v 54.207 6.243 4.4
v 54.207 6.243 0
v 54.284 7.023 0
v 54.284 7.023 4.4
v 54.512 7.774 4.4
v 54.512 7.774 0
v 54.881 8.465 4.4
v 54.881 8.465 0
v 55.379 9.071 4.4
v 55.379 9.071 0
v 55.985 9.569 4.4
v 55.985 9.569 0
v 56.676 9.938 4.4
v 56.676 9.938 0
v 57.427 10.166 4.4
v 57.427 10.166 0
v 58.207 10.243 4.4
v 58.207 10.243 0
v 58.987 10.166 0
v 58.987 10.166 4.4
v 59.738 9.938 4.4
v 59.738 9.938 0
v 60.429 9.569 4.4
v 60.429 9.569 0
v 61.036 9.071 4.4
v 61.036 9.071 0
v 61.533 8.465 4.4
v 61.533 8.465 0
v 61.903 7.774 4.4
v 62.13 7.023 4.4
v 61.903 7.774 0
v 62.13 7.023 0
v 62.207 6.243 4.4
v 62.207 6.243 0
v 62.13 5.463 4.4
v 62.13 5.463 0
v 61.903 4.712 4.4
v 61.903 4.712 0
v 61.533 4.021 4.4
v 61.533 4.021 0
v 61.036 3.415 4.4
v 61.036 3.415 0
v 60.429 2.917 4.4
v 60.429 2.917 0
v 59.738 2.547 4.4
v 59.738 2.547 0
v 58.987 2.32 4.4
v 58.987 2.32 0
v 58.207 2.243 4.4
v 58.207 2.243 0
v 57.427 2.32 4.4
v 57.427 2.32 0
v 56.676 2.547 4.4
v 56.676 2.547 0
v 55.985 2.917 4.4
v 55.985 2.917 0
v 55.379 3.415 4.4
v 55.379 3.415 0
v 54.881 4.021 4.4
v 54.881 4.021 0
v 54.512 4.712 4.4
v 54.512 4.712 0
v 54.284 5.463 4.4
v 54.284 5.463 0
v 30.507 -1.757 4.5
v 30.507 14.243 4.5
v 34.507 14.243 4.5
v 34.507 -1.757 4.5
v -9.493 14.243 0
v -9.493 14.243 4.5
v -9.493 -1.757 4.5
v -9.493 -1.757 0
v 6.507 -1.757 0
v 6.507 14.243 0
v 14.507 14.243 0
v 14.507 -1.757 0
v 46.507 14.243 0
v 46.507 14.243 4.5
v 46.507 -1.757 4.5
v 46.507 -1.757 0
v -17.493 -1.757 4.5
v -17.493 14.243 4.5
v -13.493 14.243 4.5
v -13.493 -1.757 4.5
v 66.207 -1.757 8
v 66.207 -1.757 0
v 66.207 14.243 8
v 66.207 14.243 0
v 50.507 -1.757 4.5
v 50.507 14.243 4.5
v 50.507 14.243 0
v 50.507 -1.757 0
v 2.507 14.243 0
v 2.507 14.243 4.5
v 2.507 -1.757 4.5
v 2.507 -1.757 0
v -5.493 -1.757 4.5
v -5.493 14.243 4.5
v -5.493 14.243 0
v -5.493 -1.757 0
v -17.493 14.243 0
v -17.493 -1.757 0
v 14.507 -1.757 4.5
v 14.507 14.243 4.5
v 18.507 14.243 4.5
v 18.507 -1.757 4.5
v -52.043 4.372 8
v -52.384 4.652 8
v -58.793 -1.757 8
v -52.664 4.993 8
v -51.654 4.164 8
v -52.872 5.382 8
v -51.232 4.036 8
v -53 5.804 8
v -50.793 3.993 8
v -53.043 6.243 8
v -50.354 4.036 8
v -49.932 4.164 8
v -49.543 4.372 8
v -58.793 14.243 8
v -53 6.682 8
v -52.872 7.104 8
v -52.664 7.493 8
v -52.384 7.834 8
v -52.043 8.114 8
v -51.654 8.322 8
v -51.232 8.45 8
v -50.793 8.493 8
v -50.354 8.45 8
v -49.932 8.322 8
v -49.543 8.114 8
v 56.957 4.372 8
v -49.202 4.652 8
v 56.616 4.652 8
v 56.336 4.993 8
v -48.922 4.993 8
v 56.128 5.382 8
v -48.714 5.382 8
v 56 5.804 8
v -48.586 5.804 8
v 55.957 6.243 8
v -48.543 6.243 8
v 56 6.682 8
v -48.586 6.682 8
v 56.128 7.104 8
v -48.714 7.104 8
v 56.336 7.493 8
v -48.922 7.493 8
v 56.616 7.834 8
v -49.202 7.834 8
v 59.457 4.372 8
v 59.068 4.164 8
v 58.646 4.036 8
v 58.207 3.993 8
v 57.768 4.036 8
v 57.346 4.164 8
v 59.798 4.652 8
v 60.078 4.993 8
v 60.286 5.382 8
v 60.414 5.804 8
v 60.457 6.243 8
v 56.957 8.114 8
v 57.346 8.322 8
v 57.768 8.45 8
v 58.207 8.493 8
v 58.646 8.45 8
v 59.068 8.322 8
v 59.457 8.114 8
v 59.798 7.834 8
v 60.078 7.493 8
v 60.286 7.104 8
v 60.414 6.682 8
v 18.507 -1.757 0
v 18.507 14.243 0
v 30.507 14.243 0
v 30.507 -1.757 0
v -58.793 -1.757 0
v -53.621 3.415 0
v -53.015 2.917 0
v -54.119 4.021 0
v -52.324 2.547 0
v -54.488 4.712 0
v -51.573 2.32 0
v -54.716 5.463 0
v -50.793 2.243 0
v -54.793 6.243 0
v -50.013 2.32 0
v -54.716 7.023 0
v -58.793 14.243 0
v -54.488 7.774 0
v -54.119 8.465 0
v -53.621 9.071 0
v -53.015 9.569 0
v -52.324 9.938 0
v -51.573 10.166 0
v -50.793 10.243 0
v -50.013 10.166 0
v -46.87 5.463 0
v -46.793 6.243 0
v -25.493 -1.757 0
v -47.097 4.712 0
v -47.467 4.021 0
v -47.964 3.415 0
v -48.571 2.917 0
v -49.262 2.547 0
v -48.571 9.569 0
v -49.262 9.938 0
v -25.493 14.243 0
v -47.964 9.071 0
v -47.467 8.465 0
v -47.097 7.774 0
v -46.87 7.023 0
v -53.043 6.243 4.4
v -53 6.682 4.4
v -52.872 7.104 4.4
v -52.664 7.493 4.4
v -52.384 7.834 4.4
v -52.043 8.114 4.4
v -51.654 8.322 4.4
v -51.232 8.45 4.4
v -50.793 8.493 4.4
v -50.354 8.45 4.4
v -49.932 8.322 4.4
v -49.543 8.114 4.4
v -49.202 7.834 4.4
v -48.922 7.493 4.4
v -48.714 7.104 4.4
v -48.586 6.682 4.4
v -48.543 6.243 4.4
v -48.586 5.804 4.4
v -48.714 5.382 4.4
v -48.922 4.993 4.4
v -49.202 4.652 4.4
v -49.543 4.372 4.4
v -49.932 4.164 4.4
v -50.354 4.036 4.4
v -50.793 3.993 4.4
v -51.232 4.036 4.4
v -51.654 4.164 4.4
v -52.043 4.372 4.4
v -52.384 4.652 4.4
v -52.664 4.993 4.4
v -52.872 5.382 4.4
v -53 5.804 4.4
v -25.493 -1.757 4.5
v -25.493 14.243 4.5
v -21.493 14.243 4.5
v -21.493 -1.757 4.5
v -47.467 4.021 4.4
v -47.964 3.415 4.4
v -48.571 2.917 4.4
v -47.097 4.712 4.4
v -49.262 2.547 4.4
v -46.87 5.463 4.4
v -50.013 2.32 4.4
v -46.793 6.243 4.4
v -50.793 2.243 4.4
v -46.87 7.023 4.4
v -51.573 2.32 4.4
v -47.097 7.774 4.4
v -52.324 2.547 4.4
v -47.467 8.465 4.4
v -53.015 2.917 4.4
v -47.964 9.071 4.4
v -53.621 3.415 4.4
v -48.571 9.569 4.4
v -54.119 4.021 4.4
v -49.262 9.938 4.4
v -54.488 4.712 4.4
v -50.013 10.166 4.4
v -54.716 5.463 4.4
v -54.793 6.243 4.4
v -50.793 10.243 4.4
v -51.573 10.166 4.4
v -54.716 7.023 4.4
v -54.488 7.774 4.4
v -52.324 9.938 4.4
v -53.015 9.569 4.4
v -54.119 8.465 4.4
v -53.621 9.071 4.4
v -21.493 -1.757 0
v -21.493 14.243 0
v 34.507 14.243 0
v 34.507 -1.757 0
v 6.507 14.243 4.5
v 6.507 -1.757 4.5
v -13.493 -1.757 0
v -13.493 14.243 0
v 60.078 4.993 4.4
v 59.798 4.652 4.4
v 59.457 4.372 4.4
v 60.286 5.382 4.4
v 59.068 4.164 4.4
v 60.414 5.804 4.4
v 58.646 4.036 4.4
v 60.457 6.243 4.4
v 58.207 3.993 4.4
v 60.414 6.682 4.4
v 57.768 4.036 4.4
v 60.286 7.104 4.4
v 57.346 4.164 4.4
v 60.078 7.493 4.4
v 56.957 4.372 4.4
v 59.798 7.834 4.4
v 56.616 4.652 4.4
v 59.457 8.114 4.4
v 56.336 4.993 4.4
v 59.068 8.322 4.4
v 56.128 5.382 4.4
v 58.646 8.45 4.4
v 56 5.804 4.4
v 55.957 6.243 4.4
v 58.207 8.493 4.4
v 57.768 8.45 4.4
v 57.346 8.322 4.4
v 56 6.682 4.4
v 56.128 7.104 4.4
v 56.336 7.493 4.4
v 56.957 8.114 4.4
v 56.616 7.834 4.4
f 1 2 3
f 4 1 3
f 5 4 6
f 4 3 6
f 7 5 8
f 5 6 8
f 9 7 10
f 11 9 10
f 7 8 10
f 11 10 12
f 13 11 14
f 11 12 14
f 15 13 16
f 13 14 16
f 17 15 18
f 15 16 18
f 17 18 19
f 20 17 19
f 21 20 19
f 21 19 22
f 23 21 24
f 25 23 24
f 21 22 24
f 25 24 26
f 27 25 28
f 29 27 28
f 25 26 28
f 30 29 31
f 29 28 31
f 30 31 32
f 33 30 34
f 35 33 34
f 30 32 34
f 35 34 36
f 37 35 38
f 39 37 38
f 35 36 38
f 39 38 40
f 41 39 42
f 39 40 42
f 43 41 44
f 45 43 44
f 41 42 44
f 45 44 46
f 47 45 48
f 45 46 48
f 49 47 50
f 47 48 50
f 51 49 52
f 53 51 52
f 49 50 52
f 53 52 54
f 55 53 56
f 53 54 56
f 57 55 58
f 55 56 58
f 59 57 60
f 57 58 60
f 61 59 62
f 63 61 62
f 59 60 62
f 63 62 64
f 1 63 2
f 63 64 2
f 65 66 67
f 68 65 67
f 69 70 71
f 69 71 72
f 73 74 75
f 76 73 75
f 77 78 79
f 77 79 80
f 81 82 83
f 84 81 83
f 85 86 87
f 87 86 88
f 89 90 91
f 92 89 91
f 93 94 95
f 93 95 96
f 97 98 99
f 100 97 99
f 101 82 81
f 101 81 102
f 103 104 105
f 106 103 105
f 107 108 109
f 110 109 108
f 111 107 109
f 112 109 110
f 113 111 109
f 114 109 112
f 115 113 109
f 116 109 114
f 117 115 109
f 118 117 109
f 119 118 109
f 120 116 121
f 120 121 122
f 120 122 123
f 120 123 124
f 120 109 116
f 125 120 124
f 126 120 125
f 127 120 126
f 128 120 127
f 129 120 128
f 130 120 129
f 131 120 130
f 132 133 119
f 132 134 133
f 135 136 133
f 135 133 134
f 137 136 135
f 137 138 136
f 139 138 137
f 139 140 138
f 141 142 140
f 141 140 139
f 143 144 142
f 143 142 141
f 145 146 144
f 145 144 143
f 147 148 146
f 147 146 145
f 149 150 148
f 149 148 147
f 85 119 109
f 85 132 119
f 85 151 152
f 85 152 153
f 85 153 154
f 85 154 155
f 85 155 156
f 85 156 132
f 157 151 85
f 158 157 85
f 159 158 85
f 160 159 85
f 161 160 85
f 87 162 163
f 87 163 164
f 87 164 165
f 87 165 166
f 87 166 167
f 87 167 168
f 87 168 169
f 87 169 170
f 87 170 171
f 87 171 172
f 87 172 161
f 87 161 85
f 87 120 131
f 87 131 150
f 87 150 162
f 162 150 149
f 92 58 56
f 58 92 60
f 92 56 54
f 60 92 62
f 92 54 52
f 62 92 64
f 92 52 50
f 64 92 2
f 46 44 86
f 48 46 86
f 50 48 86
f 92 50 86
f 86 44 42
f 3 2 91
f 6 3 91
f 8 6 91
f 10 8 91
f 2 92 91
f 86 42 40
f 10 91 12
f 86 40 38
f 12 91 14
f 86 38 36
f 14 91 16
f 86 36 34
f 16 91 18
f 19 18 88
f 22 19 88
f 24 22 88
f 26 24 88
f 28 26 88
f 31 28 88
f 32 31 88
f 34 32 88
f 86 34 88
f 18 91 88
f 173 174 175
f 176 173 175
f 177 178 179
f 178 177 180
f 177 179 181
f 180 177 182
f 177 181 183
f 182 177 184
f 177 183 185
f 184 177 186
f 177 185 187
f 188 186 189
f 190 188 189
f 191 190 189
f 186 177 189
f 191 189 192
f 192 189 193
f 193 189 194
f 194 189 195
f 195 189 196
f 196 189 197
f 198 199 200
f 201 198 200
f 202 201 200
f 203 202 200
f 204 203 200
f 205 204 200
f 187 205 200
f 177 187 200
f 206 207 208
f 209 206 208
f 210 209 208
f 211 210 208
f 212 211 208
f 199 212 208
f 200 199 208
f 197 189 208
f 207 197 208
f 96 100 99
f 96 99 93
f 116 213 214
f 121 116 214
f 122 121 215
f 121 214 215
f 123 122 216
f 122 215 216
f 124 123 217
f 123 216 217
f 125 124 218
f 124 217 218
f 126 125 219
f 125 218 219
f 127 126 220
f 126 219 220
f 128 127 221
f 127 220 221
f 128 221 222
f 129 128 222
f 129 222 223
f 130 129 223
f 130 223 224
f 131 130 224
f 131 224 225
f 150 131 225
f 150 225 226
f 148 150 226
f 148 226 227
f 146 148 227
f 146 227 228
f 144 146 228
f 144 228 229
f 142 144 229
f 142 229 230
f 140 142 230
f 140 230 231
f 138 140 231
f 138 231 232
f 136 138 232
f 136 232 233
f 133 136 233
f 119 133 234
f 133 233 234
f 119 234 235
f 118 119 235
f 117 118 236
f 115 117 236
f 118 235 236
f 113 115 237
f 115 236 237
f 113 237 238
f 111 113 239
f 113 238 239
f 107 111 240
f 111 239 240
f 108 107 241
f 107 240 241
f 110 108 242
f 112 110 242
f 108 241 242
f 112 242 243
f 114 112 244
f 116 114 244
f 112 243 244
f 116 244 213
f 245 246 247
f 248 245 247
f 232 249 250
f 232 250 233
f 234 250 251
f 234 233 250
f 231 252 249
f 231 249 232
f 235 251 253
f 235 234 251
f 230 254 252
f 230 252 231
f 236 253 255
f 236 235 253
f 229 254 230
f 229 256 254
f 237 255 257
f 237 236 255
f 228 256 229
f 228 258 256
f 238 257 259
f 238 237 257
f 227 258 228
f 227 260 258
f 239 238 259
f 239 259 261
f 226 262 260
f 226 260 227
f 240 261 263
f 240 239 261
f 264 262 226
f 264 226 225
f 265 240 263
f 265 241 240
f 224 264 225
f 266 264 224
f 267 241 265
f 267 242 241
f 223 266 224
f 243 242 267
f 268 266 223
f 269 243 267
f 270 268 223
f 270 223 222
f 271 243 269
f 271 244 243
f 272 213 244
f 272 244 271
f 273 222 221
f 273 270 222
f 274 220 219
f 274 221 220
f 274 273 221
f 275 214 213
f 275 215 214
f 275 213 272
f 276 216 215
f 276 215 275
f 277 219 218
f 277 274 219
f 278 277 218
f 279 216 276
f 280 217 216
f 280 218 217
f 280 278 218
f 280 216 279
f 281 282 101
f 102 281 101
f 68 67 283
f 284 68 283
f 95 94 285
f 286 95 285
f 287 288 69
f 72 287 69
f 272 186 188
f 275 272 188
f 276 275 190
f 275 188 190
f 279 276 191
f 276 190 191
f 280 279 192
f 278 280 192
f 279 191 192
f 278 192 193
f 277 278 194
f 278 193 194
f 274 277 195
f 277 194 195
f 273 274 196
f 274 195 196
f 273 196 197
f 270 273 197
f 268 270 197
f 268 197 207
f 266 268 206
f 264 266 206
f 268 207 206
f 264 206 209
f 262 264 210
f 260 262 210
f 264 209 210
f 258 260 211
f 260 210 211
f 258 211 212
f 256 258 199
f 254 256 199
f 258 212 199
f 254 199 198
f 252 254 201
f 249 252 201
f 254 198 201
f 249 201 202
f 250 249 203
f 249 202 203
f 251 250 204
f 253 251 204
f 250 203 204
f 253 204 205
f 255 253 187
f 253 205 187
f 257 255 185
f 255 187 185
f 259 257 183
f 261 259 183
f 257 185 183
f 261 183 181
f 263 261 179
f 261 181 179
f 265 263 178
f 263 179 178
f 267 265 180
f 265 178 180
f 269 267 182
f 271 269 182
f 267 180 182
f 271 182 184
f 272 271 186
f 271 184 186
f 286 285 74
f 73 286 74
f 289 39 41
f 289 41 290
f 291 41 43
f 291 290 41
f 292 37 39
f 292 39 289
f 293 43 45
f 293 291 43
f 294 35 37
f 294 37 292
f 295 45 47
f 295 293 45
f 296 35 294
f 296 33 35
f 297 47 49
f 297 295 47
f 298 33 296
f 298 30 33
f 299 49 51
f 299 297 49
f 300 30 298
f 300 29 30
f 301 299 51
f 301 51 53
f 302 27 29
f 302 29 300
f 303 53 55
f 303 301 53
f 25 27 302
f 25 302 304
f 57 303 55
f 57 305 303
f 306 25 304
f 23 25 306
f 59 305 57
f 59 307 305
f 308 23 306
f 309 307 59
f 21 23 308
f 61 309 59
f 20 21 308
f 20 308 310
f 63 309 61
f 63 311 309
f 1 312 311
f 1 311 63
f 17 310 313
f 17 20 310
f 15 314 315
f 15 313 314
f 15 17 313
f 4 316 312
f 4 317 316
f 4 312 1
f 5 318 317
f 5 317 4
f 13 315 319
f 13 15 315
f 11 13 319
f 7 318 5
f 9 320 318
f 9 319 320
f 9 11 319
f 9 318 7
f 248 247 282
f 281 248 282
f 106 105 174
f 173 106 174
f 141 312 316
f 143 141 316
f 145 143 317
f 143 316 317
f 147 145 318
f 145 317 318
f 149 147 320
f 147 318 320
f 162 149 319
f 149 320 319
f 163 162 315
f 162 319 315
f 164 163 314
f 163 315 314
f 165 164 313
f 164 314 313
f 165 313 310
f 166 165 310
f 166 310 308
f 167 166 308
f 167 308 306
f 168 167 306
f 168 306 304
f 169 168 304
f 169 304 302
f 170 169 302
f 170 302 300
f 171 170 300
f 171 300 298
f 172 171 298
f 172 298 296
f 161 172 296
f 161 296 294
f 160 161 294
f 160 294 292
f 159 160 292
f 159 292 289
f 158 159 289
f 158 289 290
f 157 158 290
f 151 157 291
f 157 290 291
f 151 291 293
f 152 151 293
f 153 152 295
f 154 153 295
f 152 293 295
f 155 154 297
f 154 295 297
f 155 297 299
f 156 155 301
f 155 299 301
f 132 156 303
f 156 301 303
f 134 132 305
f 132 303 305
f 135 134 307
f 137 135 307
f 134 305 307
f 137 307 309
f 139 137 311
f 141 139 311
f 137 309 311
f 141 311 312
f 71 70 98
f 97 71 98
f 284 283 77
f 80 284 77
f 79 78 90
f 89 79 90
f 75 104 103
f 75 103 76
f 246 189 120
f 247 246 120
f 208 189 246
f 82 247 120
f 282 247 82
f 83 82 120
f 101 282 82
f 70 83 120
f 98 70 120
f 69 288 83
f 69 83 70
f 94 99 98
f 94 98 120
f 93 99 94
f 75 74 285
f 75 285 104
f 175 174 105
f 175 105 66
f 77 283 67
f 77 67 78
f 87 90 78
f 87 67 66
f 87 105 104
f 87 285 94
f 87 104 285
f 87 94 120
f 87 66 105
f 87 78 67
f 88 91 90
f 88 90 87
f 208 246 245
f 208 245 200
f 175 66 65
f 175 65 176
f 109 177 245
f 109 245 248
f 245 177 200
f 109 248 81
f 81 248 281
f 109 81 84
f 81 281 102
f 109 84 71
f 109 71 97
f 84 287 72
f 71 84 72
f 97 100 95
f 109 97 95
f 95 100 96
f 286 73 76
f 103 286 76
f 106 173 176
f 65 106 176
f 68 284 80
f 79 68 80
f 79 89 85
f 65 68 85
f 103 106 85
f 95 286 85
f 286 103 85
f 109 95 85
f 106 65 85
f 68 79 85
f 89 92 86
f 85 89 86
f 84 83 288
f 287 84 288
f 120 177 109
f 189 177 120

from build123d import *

# Parameters (mm, degrees)
SKETCH2_W           = 125
SKETCH2_H           = 16
BOSS_EXTRUDE1_DEPTH = 8
SKETCH3_W           = 4
SKETCH3_H           = 6.863597229
SKETCH3_H_2         = 10.419332053
CUT_EXTRUDE1_DEPTH  = 17
SKETCH4_R           = 4
CUT_EXTRUDE2_DEPTH  = 4.4
SKETCH5_R           = 2.25
CUT_EXTRUDE3_DEPTH  = 4.6


with BuildPart() as part:
    # Sketch2 → Boss-Extrude1 (new body)
    with BuildSketch(Plane.XY):
        with Locations((3.707075963, 6.242976067)):
            Rectangle(SKETCH2_W, SKETCH2_H)
    extrude(amount=BOSS_EXTRUDE1_DEPTH)

    # Sketch3 → Cut-Extrude1 (cut, through all)
    with BuildSketch(Plane(origin=(0, 14.242976067, 0), x_dir=(1, 0, 0), z_dir=(0, 1, 0))):
        with Locations((48.507075963, -1.068201385)):
            Rectangle(SKETCH3_W, SKETCH3_H)
        with Locations((32.507075963, 0.709666027)):
            Rectangle(SKETCH3_W, SKETCH3_H_2)
        with Locations((16.507075963, 0.709666027)):
            Rectangle(SKETCH3_W, SKETCH3_H_2)
        with Locations((4.507075963, 0.709666027)):
            Rectangle(SKETCH3_W, SKETCH3_H_2)
        with Locations((-7.492924037, 0.709666027)):
            Rectangle(SKETCH3_W, SKETCH3_H_2)
        with Locations((-15.492924037, 0.709666027)):
            Rectangle(SKETCH3_W, SKETCH3_H_2)
        with Locations((-23.492924037, 0.709666027)):
            Rectangle(SKETCH3_W, SKETCH3_H_2)
    extrude(amount=-CUT_EXTRUDE1_DEPTH, mode=Mode.SUBTRACT)

    # Sketch4 → Cut-Extrude2 (cut)
    with BuildSketch(Plane(origin=(0, 0, 0), x_dir=(-1, 0, 0), z_dir=(0, 0, -1))):
        with Locations((50.792924037, 6.242976067)):
            Circle(SKETCH4_R)
        with Locations((-58.207075963, 6.242976067)):
            Circle(SKETCH4_R)
    extrude(amount=-CUT_EXTRUDE2_DEPTH, mode=Mode.SUBTRACT)

    # Sketch5 → Cut-Extrude3 (cut, through all)
    with BuildSketch(Plane(origin=(0, 0, 4.4), x_dir=(-1, 0, 0), z_dir=(0, 0, -1))):
        with Locations((50.792924037, 6.242976067)):
            Circle(SKETCH5_R)
        with Locations((-58.207075963, 6.242976067)):
            Circle(SKETCH5_R)
    extrude(amount=-CUT_EXTRUDE3_DEPTH, mode=Mode.SUBTRACT)


solid = part.part
